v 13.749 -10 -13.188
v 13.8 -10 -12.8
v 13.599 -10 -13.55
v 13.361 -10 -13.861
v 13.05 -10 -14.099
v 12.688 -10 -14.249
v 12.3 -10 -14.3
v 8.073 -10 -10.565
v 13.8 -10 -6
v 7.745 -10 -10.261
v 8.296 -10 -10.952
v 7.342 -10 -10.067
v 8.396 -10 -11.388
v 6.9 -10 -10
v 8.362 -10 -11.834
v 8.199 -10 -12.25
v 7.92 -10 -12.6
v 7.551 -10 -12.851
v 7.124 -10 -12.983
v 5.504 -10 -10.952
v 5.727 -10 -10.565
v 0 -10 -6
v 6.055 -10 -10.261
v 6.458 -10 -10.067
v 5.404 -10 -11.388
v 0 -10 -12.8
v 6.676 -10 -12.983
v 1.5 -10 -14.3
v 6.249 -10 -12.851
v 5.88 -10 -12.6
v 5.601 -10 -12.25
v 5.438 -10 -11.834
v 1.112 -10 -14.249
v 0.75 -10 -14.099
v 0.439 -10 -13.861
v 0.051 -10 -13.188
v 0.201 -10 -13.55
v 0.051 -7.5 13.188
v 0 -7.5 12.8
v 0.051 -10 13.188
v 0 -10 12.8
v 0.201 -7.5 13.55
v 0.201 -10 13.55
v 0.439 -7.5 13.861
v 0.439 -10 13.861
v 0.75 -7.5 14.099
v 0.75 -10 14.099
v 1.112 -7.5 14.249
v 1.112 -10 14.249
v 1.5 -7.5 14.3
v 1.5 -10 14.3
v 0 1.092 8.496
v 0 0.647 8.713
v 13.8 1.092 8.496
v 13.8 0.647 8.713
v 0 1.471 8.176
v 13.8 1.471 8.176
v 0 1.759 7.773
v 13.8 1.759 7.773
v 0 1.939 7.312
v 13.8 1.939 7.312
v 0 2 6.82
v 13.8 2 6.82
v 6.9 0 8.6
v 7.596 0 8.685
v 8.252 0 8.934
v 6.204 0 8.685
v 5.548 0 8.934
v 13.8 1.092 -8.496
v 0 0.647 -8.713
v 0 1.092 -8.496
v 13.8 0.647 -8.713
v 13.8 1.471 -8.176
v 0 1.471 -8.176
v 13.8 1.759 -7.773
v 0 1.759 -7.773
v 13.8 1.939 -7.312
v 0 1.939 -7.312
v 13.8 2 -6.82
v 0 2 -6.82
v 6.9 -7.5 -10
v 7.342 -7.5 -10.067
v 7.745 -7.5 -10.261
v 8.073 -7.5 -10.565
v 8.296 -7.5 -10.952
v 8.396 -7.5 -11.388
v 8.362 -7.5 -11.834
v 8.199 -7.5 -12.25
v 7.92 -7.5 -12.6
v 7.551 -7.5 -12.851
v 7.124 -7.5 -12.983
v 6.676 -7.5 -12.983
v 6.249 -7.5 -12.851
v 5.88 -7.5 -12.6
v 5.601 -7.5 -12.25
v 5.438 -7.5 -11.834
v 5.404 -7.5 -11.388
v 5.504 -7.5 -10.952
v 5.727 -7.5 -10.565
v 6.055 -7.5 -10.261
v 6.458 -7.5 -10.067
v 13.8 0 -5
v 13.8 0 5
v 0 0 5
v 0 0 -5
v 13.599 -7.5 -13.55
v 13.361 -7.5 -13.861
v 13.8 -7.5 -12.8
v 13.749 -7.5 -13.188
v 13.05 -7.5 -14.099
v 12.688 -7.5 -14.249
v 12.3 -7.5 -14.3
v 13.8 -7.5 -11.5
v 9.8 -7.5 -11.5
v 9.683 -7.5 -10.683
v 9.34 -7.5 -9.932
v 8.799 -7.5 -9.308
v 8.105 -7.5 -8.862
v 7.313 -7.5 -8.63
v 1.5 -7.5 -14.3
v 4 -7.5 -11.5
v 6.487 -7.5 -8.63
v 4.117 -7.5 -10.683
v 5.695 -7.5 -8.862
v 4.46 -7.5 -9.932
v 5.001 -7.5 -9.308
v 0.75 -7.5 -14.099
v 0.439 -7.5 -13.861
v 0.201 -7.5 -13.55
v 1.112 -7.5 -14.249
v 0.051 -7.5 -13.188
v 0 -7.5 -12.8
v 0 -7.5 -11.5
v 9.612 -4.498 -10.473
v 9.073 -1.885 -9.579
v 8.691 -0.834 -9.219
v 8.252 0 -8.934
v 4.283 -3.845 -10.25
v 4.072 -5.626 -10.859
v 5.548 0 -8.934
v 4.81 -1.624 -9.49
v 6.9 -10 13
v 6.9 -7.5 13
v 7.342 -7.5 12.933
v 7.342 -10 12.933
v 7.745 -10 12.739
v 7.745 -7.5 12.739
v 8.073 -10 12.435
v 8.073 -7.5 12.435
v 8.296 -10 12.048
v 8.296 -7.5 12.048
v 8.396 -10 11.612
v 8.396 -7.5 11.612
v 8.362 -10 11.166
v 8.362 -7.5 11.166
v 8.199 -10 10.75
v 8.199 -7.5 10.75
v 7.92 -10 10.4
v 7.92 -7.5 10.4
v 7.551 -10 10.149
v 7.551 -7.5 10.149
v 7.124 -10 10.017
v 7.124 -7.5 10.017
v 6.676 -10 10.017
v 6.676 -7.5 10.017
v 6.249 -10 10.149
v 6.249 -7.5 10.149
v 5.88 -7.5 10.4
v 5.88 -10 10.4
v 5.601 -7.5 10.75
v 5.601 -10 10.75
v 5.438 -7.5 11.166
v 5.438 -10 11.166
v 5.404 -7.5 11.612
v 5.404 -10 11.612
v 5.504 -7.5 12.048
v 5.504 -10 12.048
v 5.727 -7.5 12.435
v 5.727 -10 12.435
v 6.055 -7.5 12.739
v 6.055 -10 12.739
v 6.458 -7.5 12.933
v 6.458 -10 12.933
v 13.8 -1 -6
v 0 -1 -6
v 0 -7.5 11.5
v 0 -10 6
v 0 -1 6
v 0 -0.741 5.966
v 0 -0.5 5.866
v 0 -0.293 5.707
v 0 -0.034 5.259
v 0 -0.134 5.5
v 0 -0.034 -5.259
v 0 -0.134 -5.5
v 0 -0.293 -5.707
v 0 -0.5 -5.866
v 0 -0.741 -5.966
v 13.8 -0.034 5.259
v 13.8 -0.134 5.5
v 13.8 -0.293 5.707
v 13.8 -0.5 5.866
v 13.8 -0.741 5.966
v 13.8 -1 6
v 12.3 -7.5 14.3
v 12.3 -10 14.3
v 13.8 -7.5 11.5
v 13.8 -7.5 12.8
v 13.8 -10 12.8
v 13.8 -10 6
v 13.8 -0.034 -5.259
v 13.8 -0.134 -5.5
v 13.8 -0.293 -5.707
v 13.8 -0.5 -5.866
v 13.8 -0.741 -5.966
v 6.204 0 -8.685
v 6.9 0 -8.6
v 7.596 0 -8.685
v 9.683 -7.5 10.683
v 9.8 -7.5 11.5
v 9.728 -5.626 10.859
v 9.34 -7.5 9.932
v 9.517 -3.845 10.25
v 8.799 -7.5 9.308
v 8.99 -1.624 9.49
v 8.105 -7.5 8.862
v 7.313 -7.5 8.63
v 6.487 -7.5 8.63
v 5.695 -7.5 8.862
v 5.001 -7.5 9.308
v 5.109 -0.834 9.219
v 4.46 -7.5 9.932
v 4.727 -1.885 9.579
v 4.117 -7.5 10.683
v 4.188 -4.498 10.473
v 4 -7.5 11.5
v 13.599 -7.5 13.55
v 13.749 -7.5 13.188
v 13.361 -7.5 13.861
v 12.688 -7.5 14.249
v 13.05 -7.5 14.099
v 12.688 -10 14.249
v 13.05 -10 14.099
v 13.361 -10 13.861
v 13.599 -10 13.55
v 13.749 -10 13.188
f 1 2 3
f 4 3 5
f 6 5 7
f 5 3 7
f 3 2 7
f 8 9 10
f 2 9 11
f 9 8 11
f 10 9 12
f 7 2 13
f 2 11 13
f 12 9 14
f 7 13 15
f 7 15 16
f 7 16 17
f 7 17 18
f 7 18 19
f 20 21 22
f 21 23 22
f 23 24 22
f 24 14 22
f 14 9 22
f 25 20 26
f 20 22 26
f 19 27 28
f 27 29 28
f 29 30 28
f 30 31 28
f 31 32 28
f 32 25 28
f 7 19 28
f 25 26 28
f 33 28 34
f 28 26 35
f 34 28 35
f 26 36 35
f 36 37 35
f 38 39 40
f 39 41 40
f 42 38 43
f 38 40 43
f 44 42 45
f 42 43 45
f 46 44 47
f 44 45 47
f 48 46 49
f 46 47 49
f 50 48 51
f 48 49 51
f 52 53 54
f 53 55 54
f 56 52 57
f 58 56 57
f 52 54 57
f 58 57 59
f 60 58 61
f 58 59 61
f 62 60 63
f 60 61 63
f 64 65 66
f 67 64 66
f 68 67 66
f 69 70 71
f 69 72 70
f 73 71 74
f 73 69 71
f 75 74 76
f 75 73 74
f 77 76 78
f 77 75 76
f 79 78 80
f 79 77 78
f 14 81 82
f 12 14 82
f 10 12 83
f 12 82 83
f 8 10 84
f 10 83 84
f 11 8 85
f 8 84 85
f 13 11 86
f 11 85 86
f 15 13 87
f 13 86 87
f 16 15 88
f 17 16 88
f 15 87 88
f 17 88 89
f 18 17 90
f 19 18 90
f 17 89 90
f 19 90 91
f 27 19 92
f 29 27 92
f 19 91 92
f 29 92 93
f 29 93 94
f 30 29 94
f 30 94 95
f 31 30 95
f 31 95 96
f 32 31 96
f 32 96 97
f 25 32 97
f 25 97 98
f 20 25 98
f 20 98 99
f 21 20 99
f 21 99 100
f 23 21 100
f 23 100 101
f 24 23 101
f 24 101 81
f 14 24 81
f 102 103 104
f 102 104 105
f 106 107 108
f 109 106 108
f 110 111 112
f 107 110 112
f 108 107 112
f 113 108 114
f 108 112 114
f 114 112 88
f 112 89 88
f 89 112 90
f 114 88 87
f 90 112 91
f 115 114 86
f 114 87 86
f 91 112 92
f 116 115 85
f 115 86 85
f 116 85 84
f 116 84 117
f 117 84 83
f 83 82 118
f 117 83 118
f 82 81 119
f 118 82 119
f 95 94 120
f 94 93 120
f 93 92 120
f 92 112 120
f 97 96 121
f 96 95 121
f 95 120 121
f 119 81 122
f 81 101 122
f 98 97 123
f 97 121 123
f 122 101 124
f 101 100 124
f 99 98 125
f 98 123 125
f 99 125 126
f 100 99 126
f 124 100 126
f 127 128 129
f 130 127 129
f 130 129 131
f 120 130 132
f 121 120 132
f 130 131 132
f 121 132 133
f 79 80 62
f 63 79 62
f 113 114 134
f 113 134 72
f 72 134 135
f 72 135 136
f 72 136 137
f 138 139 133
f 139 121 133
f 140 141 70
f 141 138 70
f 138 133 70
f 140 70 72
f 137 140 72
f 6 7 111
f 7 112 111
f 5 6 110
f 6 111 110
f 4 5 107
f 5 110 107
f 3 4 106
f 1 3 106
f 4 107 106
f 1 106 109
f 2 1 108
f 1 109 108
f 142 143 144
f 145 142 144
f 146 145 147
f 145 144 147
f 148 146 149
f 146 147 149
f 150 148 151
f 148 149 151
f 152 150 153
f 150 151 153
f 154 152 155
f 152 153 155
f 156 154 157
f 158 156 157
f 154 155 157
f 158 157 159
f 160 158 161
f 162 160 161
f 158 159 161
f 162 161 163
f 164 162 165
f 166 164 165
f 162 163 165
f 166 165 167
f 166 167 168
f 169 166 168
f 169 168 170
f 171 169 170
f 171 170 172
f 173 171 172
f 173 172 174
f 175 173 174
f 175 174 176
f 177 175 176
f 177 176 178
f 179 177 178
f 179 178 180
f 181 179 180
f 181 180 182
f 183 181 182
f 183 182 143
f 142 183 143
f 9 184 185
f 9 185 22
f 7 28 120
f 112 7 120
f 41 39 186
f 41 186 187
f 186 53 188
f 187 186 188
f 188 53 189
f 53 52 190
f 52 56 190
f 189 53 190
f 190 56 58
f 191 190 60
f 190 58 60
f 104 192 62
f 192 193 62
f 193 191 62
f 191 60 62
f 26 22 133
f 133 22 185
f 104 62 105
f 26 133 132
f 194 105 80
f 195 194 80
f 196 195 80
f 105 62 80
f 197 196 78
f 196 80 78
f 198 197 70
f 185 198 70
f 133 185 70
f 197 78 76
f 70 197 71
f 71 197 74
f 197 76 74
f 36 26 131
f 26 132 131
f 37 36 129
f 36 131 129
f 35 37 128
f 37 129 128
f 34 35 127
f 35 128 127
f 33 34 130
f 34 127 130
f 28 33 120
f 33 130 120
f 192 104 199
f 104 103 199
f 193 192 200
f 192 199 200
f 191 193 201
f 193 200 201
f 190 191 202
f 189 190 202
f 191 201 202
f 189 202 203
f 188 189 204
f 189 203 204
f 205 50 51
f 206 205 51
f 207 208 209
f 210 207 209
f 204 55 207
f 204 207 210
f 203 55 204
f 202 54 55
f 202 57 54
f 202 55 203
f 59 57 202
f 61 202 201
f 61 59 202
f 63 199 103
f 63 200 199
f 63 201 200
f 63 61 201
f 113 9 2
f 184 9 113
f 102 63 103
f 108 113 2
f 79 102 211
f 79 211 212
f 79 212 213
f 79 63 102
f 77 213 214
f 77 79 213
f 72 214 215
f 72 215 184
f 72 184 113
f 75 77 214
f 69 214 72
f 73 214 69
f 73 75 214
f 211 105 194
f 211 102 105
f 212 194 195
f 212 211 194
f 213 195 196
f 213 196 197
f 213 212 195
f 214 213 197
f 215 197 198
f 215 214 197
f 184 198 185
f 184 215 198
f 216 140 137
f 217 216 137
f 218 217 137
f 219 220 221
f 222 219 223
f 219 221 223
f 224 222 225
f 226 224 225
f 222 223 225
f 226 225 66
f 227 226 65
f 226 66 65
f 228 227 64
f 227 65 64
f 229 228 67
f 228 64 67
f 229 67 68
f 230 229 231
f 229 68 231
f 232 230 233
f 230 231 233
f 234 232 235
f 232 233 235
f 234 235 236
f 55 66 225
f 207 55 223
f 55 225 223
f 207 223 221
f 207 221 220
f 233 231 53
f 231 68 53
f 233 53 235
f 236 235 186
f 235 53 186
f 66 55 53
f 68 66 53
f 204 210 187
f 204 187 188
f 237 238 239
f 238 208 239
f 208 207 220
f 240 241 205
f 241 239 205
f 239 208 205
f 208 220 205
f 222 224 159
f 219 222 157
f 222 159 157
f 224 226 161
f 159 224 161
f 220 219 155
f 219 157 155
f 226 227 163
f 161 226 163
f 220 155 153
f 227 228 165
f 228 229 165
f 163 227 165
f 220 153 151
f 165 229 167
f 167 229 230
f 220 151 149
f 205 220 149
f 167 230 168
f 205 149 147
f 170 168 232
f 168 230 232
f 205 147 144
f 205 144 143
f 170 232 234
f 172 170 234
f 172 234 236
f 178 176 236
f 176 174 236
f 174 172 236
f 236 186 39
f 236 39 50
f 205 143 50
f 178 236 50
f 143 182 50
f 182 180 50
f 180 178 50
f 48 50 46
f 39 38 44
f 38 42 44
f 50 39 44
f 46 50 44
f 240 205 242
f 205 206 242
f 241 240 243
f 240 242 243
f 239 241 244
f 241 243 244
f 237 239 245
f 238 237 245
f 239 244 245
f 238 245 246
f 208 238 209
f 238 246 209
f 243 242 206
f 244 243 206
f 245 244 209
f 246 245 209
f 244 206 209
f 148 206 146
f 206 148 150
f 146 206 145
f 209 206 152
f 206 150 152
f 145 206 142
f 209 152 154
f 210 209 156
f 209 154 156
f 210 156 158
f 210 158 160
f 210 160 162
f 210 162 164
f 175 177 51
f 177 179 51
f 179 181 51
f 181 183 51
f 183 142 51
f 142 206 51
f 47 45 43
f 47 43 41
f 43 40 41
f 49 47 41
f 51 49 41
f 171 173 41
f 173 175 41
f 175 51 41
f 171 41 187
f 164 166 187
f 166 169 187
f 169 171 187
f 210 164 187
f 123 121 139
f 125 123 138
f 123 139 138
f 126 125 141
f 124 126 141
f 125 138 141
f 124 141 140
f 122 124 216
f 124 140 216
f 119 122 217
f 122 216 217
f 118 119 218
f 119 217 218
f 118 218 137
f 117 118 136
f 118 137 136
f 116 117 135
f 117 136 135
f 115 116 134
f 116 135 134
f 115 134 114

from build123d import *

# Parameters (mm, degrees)
SALIENTE_EXTRUIR1_DEPTH = 13.8
CROQUIS3_R              = 1.5
CORTAR_EXTRUIR1_DEPTH   = 10
CROQUIS3_3_R            = 2.9
CROQUIS3_3_R_2          = 1.5
CORTAR_EXTRUIR2_DEPTH   = 7.5
REDONDEO1_R             = 1
REDONDEO2_R             = 2
REDONDEO3_R             = 1.5


with BuildPart() as part:
    # Croquis1 → Saliente-Extruir1 (new body)
    with BuildSketch(Plane(origin=(0, 0, 0), x_dir=(0, 0, -1), z_dir=(1, 0, 0))):
        Polygon((-6, 0), (6, 0), (6, -10), (14.3, -10), (14.3, -7.5), (11.5, -7.5), (8.25, 2), (-8.25, 2), (-11.5, -7.5), (-14.3, -7.5), (-14.3, -10), (-6, -10), align=None)
    extrude(amount=SALIENTE_EXTRUIR1_DEPTH)

    # Croquis3 → Cortar-Extruir1 (cut)
    with BuildSketch(Plane(origin=(0, 0, 0), x_dir=(1, 0, 0), z_dir=(0, 1, 0))):
        with Locations(Location((6.9, -11.5, 0), (0, 0, 270))):
            Circle(CROQUIS3_R)
        with Locations(Location((6.9, 11.5, 0), (0, 0, 270))):
            Circle(CROQUIS3_R)
    extrude(amount=-CORTAR_EXTRUIR1_DEPTH, mode=Mode.SUBTRACT)

    # Croquis3<3> → Cortar-Extruir2 (cut)
    # profile 1 of 2: a face of its own
    with BuildSketch(Plane(origin=(0, 0, 0), x_dir=(1, 0, 0), z_dir=(0, 1, 0))):
        with Locations((6.9, -11.5)):
            Circle(CROQUIS3_3_R)
        with Locations(Location((6.9, -11.5, 0), (0, 0, 270))):
            Circle(CROQUIS3_3_R_2, mode=Mode.SUBTRACT)
    # profile 2 of 2: a face of its own
    with BuildSketch(Plane(origin=(0, 0, 0), x_dir=(1, 0, 0), z_dir=(0, 1, 0))):
        with Locations((6.9, 11.5)):
            Circle(CROQUIS3_3_R)
        with Locations(Location((6.9, 11.5, 0), (0, 0, 270))):
            Circle(CROQUIS3_3_R_2, mode=Mode.SUBTRACT)
    extrude(amount=-CORTAR_EXTRUIR2_DEPTH, mode=Mode.SUBTRACT)

    # Redondeo1
    redondeo1_edges = [part.edges().sort_by_distance(p)[0] for p in [
        (6.9, 0, -6),
        (6.9, 0, 6),
    ]]
    fillet(redondeo1_edges, radius=REDONDEO1_R)

    # Redondeo2
    redondeo2_edges = [part.edges().sort_by_distance(p)[0] for p in [
        (6.9, 2, 8.25),
        (6.9, 2, -8.25),
    ]]
    fillet(redondeo2_edges, radius=REDONDEO2_R)

    # Redondeo3
    redondeo3_edges = [part.edges().sort_by_distance(p)[0] for p in [
        (13.8, -8.75, -14.3),
        (0, -8.75, 14.3),
        (0, -8.75, -14.3),
        (13.8, -8.75, 14.3),
    ]]
    fillet(redondeo3_edges, radius=REDONDEO3_R)


solid = part.part
